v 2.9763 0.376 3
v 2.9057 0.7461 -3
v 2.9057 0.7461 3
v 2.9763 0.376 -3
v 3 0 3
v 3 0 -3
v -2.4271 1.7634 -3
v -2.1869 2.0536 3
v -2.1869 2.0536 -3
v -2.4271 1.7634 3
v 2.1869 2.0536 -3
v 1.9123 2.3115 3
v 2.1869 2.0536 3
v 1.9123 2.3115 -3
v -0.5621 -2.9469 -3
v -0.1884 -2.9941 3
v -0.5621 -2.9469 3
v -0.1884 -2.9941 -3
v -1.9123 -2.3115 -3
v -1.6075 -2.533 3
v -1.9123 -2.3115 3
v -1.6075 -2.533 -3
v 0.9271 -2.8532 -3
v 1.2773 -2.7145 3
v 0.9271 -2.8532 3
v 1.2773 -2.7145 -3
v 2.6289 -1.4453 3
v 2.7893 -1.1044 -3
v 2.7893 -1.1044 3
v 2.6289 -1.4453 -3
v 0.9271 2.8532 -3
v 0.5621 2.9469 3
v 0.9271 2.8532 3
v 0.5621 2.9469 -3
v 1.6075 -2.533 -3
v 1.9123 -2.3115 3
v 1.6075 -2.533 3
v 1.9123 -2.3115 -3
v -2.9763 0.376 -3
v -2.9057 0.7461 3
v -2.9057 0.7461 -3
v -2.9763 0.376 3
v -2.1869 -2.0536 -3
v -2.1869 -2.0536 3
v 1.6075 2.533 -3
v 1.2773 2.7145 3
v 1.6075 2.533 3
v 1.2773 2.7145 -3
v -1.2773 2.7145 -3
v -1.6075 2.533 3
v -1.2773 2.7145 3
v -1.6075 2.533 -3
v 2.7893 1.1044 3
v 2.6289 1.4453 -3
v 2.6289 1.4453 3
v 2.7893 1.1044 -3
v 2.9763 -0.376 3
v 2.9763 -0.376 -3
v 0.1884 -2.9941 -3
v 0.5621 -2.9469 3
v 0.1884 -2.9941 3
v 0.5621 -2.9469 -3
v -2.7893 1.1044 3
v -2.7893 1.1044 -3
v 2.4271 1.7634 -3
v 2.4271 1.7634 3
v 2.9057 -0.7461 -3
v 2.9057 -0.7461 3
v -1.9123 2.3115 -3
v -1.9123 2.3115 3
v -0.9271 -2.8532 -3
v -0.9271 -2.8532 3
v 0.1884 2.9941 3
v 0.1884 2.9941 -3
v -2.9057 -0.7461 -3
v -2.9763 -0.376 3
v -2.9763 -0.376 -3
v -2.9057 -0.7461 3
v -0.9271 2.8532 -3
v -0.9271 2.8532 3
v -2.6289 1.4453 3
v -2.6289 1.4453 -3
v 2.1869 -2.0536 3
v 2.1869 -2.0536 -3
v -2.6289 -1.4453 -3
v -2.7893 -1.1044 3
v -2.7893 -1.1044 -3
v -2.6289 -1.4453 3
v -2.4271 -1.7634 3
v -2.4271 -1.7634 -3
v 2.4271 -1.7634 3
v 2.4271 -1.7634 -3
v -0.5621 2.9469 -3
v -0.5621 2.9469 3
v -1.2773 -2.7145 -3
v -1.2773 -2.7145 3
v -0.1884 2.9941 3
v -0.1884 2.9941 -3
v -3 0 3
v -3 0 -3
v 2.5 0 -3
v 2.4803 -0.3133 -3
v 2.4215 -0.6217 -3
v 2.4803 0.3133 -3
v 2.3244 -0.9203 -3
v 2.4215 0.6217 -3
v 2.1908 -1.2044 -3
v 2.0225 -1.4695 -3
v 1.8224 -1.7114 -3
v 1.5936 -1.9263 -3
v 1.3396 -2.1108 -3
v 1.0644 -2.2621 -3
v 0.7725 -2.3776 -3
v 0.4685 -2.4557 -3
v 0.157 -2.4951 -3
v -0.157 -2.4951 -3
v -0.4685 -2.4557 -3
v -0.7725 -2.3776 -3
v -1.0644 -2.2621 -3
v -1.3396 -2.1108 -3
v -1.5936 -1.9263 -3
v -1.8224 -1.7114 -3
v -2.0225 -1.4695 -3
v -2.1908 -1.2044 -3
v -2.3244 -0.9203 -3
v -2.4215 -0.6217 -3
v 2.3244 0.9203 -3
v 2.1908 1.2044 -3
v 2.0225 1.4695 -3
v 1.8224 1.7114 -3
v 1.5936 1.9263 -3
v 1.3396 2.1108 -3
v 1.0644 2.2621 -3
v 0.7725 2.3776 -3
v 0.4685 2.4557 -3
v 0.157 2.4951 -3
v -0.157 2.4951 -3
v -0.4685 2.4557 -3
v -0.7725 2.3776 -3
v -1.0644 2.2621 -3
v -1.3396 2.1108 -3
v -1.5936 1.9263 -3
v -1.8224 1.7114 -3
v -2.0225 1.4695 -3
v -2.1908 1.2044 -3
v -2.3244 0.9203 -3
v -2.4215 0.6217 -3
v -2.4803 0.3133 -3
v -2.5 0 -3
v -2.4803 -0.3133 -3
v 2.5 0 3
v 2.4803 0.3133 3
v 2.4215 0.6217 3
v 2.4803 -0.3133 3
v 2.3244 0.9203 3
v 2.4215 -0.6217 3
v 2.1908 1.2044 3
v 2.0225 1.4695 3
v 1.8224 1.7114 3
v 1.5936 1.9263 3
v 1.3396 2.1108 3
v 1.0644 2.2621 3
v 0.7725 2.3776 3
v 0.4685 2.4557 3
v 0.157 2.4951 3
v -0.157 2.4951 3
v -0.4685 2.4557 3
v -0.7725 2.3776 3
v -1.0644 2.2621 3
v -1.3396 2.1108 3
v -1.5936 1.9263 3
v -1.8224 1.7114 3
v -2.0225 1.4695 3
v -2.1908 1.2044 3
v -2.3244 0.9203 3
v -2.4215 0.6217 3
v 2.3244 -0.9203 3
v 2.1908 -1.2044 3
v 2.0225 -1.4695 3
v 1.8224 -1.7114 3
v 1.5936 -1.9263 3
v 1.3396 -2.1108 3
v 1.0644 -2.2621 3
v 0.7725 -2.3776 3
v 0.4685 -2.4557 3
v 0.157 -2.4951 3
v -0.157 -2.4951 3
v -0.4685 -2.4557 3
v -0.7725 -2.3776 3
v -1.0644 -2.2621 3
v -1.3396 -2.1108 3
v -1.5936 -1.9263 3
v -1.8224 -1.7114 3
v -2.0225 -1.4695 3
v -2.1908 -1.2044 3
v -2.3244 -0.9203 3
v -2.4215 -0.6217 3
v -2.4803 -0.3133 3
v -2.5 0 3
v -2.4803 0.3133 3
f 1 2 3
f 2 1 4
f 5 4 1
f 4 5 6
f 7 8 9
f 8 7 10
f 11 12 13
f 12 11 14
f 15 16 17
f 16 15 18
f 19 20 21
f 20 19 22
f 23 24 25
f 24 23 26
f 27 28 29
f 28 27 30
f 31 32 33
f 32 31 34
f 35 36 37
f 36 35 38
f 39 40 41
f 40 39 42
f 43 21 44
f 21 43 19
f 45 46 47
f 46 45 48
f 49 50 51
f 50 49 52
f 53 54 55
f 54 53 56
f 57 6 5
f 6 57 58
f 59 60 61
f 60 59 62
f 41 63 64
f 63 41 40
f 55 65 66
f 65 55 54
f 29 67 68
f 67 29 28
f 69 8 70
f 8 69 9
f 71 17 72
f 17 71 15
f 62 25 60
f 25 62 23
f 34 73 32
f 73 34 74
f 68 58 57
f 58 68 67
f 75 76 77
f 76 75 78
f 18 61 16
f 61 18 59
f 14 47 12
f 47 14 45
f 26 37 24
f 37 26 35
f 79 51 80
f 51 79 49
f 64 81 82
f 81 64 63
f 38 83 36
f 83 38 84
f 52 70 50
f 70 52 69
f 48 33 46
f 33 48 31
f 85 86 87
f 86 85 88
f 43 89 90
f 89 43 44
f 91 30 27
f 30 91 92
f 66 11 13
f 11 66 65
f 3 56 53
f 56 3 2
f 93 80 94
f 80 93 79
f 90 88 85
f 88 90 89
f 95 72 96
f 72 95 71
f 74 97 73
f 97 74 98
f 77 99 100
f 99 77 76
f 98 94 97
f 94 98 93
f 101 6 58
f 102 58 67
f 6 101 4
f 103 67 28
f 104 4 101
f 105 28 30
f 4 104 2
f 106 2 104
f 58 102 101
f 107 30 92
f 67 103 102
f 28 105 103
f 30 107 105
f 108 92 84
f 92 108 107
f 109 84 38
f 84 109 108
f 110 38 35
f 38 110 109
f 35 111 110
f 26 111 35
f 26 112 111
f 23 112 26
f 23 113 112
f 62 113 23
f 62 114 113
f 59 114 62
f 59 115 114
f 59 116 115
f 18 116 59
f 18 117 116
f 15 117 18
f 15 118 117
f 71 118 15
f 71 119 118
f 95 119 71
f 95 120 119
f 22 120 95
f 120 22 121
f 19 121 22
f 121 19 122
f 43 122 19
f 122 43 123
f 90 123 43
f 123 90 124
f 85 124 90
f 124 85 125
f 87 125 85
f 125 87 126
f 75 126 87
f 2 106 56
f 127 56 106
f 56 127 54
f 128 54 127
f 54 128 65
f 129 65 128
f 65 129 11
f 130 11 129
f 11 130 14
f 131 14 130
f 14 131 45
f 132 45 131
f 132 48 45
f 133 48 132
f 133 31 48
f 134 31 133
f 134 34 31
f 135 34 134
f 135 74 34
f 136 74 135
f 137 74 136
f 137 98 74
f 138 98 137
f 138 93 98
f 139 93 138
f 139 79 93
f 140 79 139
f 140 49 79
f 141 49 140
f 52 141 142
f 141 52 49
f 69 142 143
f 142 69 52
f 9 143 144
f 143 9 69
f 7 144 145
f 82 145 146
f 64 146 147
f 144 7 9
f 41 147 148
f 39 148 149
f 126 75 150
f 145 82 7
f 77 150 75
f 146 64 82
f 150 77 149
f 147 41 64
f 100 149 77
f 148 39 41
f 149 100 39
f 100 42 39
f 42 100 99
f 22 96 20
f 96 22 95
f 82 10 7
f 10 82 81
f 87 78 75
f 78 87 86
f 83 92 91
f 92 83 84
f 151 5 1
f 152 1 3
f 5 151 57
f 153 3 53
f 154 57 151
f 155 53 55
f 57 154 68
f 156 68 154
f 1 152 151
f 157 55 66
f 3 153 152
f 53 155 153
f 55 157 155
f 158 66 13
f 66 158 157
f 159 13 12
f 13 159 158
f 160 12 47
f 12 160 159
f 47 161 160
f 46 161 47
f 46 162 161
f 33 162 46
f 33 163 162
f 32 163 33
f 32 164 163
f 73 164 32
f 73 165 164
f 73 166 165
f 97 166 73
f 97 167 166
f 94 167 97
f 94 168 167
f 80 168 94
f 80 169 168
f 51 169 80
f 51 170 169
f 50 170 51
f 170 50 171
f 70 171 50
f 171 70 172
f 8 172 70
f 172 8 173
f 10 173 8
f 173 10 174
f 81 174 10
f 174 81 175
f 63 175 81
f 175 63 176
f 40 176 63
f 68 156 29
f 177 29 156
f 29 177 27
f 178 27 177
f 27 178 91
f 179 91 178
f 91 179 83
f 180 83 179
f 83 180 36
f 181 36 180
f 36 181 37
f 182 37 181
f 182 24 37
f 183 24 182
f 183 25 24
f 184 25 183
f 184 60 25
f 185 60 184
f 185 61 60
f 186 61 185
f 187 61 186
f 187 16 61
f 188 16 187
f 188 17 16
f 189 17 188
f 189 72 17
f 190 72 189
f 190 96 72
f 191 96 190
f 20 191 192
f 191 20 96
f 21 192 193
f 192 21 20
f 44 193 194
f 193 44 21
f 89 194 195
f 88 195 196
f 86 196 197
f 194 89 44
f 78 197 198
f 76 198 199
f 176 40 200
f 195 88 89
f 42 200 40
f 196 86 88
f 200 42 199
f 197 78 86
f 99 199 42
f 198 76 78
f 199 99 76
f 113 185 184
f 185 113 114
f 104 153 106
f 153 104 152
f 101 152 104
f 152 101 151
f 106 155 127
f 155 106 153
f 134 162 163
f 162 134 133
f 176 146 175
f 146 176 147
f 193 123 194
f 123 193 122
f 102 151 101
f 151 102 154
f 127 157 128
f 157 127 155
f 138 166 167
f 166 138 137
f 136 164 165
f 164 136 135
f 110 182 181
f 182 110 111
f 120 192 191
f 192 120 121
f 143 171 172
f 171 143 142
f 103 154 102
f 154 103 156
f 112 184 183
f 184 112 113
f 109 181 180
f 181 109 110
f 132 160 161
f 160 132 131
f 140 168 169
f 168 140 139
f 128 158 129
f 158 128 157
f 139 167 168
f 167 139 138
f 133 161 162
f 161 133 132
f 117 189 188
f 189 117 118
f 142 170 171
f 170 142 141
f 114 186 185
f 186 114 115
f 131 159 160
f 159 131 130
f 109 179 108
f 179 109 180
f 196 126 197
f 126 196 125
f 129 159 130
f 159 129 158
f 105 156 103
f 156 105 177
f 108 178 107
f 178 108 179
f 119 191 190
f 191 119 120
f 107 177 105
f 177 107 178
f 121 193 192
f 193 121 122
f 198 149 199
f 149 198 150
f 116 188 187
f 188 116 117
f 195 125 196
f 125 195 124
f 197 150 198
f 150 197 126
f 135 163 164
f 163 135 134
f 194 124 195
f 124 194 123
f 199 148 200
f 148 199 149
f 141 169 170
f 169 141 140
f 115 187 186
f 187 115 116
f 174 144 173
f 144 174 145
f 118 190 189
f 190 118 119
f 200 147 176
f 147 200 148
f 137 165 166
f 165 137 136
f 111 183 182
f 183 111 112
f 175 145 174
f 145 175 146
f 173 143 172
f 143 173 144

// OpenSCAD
$fn = 50;


difference() {
	union() {
		translate(v = [0, 0, -3.0000000000]) {
			cylinder(h = 6, r = 3.0000000000);
		}
	}
	union() {
		translate(v = [0, 0, -100.0000000000]) {
			cylinder(h = 200, r = 2.5000000000);
		}
	}
}
